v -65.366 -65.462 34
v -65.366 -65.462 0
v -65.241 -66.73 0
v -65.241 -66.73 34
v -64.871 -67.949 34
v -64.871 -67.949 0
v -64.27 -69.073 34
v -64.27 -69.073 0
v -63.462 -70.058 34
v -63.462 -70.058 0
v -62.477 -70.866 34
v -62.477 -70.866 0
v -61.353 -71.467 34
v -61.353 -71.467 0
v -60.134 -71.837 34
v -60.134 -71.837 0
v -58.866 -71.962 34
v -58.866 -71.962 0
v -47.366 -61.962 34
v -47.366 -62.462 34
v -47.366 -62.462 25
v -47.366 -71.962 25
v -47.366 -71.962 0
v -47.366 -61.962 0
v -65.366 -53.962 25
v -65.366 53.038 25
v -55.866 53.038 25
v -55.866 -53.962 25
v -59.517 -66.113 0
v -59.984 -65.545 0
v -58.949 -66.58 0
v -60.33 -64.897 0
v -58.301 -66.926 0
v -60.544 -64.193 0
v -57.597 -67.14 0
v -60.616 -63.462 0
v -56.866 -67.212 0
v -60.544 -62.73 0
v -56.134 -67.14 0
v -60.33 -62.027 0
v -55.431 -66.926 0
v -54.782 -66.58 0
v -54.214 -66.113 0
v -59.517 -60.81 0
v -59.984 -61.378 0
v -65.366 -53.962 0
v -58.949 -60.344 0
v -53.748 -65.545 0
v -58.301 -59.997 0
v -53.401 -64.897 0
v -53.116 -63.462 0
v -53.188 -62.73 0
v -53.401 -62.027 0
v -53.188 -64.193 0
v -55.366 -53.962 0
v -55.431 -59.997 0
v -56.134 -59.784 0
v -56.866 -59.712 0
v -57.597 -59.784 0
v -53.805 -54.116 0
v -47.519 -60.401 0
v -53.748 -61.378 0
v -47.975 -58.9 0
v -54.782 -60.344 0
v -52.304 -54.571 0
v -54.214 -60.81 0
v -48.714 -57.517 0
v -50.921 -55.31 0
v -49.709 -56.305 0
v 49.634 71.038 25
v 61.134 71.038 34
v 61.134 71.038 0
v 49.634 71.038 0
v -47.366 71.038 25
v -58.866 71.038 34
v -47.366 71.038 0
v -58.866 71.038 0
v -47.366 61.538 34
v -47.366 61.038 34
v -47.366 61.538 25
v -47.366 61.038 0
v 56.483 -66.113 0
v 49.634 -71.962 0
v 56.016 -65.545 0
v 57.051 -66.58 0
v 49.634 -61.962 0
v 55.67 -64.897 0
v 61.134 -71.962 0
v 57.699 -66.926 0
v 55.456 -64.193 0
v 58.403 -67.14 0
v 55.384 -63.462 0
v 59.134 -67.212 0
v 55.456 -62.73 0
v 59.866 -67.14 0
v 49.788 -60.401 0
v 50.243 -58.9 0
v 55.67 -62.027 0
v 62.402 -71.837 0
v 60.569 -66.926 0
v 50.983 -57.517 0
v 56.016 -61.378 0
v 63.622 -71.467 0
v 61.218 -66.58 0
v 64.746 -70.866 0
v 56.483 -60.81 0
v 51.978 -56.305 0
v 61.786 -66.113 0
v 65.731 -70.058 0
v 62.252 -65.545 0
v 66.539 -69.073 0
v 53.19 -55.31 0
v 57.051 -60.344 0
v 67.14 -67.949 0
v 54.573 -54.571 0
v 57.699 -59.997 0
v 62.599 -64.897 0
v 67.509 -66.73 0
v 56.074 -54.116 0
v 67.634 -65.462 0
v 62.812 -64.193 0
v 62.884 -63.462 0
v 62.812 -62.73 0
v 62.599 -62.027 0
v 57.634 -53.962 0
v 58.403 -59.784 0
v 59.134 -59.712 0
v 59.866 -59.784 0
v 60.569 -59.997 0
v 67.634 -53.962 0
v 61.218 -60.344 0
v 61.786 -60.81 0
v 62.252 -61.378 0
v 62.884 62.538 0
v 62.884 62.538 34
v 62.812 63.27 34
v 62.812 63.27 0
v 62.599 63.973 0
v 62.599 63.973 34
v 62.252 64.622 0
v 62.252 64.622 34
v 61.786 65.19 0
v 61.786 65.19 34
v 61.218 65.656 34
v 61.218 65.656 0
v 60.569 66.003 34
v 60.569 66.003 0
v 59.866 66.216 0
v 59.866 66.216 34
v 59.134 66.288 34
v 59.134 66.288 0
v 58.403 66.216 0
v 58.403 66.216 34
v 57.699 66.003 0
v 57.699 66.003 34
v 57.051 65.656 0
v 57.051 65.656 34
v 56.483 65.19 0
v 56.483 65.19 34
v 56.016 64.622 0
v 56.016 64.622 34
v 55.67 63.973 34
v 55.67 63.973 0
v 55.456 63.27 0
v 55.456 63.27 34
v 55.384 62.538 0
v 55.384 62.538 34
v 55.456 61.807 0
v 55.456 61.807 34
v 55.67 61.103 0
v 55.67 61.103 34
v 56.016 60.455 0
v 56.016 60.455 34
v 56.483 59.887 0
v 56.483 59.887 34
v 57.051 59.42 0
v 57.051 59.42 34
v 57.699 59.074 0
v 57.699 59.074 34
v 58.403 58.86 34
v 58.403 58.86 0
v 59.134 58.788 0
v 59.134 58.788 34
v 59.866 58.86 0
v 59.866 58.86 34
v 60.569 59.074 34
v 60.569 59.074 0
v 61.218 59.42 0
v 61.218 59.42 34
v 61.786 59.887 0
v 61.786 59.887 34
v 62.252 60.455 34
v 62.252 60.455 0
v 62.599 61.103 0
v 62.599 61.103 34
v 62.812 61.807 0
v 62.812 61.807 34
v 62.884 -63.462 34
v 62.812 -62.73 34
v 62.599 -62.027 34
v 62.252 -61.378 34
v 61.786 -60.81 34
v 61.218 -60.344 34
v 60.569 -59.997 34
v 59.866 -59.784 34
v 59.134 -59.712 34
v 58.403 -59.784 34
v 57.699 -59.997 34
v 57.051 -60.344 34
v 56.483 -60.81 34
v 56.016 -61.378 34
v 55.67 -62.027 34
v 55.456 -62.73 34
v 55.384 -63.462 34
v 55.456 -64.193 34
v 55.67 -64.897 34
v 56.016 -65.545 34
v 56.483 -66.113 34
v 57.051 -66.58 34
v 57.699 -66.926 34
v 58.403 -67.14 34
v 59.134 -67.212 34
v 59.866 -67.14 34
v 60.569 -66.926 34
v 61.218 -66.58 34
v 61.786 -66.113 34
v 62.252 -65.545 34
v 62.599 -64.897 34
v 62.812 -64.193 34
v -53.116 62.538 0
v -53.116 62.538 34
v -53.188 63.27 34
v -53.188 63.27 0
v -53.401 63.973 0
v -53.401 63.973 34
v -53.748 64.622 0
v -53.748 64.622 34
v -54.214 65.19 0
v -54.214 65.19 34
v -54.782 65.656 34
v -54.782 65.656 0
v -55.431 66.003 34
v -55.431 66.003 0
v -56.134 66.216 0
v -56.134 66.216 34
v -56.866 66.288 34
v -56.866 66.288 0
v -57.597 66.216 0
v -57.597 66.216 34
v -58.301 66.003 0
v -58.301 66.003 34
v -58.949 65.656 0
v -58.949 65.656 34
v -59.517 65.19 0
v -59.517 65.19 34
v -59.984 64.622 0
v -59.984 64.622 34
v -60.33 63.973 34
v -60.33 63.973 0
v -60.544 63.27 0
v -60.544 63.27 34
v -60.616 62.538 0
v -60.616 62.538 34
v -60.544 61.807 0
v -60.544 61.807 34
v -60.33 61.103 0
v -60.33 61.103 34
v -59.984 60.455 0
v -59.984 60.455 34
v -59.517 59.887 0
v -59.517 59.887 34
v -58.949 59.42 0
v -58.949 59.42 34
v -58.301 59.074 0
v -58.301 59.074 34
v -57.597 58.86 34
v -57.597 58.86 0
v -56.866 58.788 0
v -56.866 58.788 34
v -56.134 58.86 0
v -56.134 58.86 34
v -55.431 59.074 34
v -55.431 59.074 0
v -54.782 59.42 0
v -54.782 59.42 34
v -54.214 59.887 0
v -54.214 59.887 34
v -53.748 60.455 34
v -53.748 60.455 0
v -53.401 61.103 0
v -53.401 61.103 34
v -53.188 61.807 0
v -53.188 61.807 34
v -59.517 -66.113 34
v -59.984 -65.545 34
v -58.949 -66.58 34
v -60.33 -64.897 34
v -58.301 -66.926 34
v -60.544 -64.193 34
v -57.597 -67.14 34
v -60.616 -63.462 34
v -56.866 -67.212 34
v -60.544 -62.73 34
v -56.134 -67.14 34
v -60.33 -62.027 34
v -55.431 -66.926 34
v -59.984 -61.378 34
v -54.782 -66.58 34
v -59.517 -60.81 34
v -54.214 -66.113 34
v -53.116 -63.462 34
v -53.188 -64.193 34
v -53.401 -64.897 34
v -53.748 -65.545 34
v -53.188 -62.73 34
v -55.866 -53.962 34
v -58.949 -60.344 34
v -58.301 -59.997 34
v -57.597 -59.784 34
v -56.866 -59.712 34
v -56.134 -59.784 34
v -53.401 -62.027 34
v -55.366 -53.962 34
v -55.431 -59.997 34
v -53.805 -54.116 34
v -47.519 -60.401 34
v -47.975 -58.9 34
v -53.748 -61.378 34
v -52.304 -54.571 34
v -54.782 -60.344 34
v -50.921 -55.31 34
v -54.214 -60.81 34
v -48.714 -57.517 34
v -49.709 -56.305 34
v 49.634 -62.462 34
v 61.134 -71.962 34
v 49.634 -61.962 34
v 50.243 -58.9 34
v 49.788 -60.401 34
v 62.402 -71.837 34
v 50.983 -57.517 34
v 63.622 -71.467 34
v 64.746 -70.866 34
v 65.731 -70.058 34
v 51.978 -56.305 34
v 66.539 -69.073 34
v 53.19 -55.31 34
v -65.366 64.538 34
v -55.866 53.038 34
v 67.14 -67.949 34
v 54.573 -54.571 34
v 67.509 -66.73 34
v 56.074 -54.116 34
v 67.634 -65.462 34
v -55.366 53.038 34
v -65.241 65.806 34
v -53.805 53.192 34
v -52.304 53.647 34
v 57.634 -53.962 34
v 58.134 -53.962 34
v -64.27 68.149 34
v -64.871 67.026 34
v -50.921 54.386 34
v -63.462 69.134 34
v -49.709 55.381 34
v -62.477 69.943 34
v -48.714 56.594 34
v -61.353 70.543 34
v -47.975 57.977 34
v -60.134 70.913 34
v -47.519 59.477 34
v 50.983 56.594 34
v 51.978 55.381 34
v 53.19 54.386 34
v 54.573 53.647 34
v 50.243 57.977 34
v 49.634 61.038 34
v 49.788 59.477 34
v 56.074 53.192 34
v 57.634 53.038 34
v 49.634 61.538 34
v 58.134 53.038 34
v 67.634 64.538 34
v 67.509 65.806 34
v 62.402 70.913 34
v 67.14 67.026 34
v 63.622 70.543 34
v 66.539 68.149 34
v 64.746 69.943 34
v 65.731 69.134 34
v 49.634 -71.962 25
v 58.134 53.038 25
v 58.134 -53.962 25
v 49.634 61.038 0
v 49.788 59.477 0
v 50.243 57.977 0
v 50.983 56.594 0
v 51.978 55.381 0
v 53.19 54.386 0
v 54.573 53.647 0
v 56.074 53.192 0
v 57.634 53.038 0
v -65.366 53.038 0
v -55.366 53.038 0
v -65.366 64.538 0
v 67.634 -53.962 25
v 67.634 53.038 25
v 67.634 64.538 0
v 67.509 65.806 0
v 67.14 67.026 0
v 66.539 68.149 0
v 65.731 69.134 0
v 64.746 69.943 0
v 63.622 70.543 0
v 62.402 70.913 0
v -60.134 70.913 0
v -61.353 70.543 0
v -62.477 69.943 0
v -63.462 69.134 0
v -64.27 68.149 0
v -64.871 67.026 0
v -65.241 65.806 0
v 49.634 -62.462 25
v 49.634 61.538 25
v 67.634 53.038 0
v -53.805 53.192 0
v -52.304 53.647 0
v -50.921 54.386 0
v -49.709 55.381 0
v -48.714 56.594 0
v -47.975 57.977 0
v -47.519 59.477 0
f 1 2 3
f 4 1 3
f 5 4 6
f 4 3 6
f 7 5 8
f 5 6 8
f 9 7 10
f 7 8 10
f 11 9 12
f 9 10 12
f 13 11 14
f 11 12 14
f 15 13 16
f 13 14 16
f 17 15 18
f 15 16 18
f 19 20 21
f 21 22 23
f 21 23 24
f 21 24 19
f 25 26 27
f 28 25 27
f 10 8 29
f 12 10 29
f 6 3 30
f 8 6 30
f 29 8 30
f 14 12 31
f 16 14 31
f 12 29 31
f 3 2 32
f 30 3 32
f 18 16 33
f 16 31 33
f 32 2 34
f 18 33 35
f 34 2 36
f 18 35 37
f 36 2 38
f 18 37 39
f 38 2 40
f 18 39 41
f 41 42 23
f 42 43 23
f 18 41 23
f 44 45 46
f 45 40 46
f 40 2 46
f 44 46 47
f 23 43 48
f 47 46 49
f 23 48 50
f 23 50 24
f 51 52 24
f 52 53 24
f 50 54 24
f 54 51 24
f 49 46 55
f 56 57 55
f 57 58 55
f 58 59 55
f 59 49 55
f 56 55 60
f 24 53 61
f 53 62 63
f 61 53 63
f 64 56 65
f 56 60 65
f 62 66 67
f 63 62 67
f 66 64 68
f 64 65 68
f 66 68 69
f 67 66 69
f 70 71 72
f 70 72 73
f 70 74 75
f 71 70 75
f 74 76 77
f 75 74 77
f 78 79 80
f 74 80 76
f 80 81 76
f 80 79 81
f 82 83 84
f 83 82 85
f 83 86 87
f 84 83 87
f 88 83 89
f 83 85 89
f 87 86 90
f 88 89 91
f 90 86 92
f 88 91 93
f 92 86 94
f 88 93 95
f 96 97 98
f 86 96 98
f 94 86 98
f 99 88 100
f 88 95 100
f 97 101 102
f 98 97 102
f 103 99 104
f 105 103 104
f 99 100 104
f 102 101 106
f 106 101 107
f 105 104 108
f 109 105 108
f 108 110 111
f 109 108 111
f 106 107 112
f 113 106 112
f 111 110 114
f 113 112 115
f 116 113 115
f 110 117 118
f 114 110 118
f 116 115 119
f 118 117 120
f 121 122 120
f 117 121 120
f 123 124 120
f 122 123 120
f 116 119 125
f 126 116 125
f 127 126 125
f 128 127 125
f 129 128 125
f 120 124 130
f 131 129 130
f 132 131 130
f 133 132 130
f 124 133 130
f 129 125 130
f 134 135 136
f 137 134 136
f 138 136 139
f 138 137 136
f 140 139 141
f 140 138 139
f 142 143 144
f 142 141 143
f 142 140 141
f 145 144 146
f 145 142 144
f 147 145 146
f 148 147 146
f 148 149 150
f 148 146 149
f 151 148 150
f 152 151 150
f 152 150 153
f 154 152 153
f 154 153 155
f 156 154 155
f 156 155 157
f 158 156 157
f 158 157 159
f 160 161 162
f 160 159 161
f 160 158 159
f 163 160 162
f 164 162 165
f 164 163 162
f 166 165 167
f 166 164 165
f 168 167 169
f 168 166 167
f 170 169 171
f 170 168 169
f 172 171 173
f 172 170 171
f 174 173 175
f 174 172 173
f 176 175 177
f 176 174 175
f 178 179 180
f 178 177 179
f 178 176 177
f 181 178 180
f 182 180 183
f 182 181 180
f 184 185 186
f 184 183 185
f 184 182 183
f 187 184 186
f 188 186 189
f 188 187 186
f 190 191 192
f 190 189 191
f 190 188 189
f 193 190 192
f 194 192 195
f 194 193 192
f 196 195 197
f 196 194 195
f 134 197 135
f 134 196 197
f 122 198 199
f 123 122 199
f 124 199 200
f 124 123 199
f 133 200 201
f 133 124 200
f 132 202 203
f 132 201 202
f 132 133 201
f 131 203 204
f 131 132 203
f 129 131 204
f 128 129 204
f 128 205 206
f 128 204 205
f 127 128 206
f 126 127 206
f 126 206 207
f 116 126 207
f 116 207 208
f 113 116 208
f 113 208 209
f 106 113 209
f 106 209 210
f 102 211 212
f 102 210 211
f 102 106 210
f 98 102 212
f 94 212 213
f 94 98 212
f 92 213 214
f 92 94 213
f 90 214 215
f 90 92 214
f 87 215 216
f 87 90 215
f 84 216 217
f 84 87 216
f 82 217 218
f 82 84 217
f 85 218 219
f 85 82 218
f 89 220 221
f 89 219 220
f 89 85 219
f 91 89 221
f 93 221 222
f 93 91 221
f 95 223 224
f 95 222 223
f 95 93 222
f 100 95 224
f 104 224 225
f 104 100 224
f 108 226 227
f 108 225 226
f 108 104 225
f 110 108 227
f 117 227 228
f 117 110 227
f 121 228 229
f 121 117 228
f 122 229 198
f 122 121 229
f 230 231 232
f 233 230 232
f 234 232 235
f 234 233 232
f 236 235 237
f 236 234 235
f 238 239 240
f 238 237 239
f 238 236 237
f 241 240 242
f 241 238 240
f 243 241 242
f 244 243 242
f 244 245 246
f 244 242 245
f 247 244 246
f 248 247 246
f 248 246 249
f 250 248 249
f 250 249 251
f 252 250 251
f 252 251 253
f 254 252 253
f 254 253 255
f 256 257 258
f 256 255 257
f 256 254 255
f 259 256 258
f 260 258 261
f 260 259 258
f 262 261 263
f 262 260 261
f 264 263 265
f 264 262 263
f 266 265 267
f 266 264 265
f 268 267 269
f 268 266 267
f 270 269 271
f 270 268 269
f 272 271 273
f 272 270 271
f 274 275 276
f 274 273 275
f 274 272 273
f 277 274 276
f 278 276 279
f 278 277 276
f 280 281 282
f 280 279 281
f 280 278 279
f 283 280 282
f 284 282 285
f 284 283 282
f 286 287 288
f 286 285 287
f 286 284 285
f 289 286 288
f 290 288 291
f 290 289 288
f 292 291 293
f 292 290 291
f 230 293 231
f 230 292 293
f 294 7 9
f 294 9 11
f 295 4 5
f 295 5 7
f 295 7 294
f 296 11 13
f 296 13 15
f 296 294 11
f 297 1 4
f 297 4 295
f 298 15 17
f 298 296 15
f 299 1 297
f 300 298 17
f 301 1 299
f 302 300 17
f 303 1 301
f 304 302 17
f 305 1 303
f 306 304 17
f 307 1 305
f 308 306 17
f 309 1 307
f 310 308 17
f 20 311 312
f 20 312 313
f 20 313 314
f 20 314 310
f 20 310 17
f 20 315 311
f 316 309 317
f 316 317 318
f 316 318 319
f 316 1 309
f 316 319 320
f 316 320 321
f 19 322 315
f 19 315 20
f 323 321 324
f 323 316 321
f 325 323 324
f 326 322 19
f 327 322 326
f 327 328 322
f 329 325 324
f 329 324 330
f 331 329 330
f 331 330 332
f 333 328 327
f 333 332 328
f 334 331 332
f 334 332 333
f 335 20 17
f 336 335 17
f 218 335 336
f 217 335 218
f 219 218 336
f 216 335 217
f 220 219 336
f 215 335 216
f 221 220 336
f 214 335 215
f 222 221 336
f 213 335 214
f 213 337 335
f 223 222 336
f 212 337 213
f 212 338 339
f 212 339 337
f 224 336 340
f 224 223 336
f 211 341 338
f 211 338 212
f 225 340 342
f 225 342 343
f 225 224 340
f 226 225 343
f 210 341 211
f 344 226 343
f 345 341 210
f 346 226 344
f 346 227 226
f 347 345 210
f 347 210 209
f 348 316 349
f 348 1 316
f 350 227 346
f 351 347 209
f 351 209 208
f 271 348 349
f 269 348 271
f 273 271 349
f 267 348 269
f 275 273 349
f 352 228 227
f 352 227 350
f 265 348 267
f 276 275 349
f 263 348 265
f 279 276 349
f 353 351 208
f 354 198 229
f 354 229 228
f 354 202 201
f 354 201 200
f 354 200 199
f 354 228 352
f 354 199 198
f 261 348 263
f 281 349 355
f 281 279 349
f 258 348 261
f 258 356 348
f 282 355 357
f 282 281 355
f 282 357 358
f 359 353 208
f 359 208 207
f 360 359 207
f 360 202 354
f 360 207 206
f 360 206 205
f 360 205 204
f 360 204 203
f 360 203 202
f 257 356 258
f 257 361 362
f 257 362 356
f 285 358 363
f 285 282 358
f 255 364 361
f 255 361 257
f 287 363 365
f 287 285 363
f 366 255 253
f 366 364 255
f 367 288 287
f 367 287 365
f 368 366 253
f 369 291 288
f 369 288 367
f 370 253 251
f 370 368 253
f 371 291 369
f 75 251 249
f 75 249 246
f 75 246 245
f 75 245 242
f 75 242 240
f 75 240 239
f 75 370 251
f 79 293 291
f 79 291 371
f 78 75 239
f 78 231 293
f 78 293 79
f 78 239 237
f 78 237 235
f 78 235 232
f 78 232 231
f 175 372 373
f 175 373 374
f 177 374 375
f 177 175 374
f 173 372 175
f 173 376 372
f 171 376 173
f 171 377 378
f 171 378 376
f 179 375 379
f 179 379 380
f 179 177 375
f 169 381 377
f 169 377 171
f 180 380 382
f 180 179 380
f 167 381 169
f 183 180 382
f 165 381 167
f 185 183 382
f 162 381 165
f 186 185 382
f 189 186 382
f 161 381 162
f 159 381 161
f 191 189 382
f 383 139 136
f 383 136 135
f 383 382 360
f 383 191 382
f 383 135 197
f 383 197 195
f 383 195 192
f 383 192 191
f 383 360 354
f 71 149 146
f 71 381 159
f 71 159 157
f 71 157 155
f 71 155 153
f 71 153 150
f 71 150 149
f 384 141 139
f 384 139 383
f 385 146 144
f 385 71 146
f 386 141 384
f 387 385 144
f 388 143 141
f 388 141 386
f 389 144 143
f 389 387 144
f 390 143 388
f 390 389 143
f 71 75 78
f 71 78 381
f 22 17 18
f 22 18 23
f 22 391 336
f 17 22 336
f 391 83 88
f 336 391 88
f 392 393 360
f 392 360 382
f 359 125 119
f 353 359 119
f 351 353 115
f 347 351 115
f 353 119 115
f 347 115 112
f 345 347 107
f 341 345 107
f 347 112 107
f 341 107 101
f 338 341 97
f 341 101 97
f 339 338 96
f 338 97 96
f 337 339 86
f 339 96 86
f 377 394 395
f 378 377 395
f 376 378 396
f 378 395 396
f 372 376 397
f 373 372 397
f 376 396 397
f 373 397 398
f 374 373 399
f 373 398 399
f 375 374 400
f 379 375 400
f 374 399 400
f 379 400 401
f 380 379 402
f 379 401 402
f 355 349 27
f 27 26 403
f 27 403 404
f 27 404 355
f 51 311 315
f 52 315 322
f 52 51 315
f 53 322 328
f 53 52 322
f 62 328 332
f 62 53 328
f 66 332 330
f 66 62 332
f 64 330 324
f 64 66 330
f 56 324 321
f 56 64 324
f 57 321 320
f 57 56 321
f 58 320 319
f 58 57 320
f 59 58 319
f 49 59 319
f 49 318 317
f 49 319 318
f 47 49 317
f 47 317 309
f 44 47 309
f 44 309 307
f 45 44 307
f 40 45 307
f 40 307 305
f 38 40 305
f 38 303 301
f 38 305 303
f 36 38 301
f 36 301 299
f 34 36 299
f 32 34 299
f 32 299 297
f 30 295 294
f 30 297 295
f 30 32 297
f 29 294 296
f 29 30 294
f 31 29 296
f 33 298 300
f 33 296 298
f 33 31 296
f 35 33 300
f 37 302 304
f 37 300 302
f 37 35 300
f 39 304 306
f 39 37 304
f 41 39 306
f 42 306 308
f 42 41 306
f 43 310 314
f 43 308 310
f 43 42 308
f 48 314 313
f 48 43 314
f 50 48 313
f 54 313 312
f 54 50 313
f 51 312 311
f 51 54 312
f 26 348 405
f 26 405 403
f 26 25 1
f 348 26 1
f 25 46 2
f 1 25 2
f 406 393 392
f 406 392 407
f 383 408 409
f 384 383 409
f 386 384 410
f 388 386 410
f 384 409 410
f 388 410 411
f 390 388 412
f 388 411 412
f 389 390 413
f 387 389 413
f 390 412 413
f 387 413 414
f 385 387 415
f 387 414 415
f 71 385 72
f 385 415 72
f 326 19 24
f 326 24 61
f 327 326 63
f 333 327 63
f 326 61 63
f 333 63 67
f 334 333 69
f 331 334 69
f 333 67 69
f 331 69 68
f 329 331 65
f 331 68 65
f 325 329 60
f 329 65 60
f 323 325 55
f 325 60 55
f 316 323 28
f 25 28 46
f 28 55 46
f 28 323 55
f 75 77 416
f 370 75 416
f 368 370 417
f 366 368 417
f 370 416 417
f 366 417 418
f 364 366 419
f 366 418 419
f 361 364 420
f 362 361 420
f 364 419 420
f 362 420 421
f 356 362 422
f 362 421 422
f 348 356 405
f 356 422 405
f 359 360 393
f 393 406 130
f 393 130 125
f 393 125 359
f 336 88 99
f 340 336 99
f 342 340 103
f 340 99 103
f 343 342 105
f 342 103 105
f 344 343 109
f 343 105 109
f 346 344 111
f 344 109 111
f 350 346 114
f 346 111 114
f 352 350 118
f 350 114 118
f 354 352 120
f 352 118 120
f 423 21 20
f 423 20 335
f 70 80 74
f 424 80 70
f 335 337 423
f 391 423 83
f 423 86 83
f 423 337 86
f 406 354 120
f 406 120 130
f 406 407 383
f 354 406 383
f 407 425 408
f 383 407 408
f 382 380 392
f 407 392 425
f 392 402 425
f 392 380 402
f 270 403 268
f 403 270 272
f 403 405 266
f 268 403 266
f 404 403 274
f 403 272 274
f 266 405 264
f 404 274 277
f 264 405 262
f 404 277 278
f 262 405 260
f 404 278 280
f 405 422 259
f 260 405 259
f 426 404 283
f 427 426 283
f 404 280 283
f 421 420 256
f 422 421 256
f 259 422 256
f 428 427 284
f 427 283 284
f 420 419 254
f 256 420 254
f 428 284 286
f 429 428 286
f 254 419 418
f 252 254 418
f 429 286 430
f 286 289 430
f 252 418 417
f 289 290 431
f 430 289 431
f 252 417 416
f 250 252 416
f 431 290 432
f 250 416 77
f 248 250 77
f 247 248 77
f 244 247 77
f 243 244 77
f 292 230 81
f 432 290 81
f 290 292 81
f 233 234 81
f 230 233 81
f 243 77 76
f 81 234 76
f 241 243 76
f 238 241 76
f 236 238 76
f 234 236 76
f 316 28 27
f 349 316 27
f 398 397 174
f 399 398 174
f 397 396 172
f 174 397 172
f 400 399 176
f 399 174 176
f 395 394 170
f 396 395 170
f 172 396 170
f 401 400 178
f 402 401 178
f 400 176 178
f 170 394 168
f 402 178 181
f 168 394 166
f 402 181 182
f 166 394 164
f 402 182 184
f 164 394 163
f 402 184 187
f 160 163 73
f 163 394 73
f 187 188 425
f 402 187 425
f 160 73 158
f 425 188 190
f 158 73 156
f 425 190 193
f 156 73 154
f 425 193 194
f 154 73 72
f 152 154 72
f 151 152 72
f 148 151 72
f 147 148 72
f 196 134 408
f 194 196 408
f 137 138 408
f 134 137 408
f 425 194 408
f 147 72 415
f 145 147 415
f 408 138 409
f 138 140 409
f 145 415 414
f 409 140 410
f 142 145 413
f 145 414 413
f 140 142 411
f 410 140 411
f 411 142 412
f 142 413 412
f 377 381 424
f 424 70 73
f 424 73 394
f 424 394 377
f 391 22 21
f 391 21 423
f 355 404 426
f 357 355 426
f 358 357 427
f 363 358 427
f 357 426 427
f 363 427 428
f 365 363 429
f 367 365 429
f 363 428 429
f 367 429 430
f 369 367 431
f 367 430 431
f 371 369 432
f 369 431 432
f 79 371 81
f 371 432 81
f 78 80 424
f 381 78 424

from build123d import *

# Parameters (mm, degrees)
F0_W     = 114
F0_H     = 124
F1_DEPTH = 34
F2_W     = 97
F2_H     = 42.713016
F2_W_2   = 43.496885
F2_H_2   = 107
F2_W_3   = 85.450368
F2_H_3   = 43.636596
F3_DEPTH = 25
F4_R     = 3.75
F5_DEPTH = 34
F6_DEPTH = 34


with BuildPart() as f1:
    # F0 (on Top) → F1 (new body)
    with BuildSketch(Plane.XY):
        with BuildLine():
            ThreePointArc((-65.365605, -65.46179), (-63.461799, -70.057984), (-58.865605, -71.96179))
            Line((-58.865605, -71.96179), (61.134395, -71.96179))
            ThreePointArc((61.134395, -71.96179), (65.730589, -70.057984), (67.634395, -65.46179))
            Line((67.634395, -65.46179), (67.634395, 64.53821))
            ThreePointArc((67.634395, 64.53821), (65.730589, 69.134404), (61.134395, 71.03821))
            Line((61.134395, 71.03821), (-58.865605, 71.03821))
            ThreePointArc((-58.865605, 71.03821), (-63.461799, 69.134404), (-65.365605, 64.53821))
            Line((-65.365605, 64.53821), (-65.365605, -65.46179))
        make_face()
        with Locations((1.134395, -0.46179)):
            Rectangle(F0_W, F0_H, mode=Mode.SUBTRACT)
    extrude(amount=F1_DEPTH)

    # F2 (on face) → F3 (cut)
    with BuildSketch(Plane(origin=(0, 0, 0), x_dir=(1, 0, 0), z_dir=(0, 0, -1))):
        with Locations((1.134395, 75.318298)):
            Rectangle(F2_W, F2_H)
        with Locations((-69.114047, 0.46179)):
            Rectangle(F2_W_2, F2_H_2)
        with Locations((92.359579, 0.46179)):
            Rectangle(F2_W_3, F2_H_2)
        with Locations((1.134395, -74.856508)):
            Rectangle(F2_W, F2_H_3)
    extrude(amount=-F3_DEPTH, mode=Mode.SUBTRACT)

    # F4 (on Top) → F5 (join)
    with BuildSketch(Plane.XY):
        with BuildLine():
            ThreePointArc((-47.365605, -61.96179), (-49.708751, -56.304936), (-55.365605, -53.96179))
            Line((-55.365605, -53.96179), (-65.365605, -53.96179))
            Line((-65.365605, -53.96179), (-65.365605, -65.46179))
            ThreePointArc((-65.365605, -65.46179), (-63.461799, -70.057984), (-58.865605, -71.96179))
            Line((-58.865605, -71.96179), (-47.365605, -71.96179))
            Line((-47.365605, -71.96179), (-47.365605, -61.96179))
        make_face()
        with Locations((-56.865605, -63.46179)):
            Circle(F4_R, mode=Mode.SUBTRACT)
        with BuildLine():
            ThreePointArc((57.634395, -53.96179), (51.977541, -56.304936), (49.634395, -61.96179))
            Line((49.634395, -61.96179), (49.634395, -71.96179))
            Line((49.634395, -71.96179), (61.134395, -71.96179))
            ThreePointArc((61.134395, -71.96179), (65.730589, -70.057984), (67.634395, -65.46179))
            Line((67.634395, -65.46179), (67.634395, -53.96179))
            Line((67.634395, -53.96179), (57.634395, -53.96179))
        make_face()
        with Locations((59.134395, -63.46179)):
            Circle(F4_R, mode=Mode.SUBTRACT)
        with BuildLine():
            Line((57.634395, 53.03821), (67.634395, 53.03821))
            Line((67.634395, 53.03821), (67.634395, 64.53821))
            ThreePointArc((67.634395, 64.53821), (65.730589, 69.134404), (61.134395, 71.03821))
            Line((61.134395, 71.03821), (49.634395, 71.03821))
            Line((49.634395, 71.03821), (49.634395, 61.03821))
            ThreePointArc((49.634395, 61.03821), (51.977541, 55.381355), (57.634395, 53.03821))
        make_face()
        with Locations((59.134395, 62.53821)):
            Circle(F4_R, mode=Mode.SUBTRACT)
        with BuildLine():
            Line((-65.365605, 53.03821), (-55.365605, 53.03821))
            ThreePointArc((-55.365605, 53.03821), (-49.708751, 55.381355), (-47.365605, 61.03821))
            Line((-47.365605, 61.03821), (-47.365605, 71.03821))
            Line((-47.365605, 71.03821), (-58.865605, 71.03821))
            ThreePointArc((-58.865605, 71.03821), (-63.461799, 69.134404), (-65.365605, 64.53821))
            Line((-65.365605, 64.53821), (-65.365605, 53.03821))
        make_face()
        with Locations((-56.865605, 62.53821)):
            Circle(F4_R, mode=Mode.SUBTRACT)
    extrude(amount=F5_DEPTH)

    # F4 (on Top) → F6 (cut)
    with BuildSketch(Plane.XY):
        with Locations((-56.865605, -63.46179)):
            Circle(F4_R)
        with Locations((59.134395, -63.46179)):
            Circle(F4_R)
        with Locations((59.134395, 62.53821)):
            Circle(F4_R)
        with Locations((-56.865605, 62.53821)):
            Circle(F4_R)
    extrude(amount=F6_DEPTH, mode=Mode.SUBTRACT)


solid = f1.part
